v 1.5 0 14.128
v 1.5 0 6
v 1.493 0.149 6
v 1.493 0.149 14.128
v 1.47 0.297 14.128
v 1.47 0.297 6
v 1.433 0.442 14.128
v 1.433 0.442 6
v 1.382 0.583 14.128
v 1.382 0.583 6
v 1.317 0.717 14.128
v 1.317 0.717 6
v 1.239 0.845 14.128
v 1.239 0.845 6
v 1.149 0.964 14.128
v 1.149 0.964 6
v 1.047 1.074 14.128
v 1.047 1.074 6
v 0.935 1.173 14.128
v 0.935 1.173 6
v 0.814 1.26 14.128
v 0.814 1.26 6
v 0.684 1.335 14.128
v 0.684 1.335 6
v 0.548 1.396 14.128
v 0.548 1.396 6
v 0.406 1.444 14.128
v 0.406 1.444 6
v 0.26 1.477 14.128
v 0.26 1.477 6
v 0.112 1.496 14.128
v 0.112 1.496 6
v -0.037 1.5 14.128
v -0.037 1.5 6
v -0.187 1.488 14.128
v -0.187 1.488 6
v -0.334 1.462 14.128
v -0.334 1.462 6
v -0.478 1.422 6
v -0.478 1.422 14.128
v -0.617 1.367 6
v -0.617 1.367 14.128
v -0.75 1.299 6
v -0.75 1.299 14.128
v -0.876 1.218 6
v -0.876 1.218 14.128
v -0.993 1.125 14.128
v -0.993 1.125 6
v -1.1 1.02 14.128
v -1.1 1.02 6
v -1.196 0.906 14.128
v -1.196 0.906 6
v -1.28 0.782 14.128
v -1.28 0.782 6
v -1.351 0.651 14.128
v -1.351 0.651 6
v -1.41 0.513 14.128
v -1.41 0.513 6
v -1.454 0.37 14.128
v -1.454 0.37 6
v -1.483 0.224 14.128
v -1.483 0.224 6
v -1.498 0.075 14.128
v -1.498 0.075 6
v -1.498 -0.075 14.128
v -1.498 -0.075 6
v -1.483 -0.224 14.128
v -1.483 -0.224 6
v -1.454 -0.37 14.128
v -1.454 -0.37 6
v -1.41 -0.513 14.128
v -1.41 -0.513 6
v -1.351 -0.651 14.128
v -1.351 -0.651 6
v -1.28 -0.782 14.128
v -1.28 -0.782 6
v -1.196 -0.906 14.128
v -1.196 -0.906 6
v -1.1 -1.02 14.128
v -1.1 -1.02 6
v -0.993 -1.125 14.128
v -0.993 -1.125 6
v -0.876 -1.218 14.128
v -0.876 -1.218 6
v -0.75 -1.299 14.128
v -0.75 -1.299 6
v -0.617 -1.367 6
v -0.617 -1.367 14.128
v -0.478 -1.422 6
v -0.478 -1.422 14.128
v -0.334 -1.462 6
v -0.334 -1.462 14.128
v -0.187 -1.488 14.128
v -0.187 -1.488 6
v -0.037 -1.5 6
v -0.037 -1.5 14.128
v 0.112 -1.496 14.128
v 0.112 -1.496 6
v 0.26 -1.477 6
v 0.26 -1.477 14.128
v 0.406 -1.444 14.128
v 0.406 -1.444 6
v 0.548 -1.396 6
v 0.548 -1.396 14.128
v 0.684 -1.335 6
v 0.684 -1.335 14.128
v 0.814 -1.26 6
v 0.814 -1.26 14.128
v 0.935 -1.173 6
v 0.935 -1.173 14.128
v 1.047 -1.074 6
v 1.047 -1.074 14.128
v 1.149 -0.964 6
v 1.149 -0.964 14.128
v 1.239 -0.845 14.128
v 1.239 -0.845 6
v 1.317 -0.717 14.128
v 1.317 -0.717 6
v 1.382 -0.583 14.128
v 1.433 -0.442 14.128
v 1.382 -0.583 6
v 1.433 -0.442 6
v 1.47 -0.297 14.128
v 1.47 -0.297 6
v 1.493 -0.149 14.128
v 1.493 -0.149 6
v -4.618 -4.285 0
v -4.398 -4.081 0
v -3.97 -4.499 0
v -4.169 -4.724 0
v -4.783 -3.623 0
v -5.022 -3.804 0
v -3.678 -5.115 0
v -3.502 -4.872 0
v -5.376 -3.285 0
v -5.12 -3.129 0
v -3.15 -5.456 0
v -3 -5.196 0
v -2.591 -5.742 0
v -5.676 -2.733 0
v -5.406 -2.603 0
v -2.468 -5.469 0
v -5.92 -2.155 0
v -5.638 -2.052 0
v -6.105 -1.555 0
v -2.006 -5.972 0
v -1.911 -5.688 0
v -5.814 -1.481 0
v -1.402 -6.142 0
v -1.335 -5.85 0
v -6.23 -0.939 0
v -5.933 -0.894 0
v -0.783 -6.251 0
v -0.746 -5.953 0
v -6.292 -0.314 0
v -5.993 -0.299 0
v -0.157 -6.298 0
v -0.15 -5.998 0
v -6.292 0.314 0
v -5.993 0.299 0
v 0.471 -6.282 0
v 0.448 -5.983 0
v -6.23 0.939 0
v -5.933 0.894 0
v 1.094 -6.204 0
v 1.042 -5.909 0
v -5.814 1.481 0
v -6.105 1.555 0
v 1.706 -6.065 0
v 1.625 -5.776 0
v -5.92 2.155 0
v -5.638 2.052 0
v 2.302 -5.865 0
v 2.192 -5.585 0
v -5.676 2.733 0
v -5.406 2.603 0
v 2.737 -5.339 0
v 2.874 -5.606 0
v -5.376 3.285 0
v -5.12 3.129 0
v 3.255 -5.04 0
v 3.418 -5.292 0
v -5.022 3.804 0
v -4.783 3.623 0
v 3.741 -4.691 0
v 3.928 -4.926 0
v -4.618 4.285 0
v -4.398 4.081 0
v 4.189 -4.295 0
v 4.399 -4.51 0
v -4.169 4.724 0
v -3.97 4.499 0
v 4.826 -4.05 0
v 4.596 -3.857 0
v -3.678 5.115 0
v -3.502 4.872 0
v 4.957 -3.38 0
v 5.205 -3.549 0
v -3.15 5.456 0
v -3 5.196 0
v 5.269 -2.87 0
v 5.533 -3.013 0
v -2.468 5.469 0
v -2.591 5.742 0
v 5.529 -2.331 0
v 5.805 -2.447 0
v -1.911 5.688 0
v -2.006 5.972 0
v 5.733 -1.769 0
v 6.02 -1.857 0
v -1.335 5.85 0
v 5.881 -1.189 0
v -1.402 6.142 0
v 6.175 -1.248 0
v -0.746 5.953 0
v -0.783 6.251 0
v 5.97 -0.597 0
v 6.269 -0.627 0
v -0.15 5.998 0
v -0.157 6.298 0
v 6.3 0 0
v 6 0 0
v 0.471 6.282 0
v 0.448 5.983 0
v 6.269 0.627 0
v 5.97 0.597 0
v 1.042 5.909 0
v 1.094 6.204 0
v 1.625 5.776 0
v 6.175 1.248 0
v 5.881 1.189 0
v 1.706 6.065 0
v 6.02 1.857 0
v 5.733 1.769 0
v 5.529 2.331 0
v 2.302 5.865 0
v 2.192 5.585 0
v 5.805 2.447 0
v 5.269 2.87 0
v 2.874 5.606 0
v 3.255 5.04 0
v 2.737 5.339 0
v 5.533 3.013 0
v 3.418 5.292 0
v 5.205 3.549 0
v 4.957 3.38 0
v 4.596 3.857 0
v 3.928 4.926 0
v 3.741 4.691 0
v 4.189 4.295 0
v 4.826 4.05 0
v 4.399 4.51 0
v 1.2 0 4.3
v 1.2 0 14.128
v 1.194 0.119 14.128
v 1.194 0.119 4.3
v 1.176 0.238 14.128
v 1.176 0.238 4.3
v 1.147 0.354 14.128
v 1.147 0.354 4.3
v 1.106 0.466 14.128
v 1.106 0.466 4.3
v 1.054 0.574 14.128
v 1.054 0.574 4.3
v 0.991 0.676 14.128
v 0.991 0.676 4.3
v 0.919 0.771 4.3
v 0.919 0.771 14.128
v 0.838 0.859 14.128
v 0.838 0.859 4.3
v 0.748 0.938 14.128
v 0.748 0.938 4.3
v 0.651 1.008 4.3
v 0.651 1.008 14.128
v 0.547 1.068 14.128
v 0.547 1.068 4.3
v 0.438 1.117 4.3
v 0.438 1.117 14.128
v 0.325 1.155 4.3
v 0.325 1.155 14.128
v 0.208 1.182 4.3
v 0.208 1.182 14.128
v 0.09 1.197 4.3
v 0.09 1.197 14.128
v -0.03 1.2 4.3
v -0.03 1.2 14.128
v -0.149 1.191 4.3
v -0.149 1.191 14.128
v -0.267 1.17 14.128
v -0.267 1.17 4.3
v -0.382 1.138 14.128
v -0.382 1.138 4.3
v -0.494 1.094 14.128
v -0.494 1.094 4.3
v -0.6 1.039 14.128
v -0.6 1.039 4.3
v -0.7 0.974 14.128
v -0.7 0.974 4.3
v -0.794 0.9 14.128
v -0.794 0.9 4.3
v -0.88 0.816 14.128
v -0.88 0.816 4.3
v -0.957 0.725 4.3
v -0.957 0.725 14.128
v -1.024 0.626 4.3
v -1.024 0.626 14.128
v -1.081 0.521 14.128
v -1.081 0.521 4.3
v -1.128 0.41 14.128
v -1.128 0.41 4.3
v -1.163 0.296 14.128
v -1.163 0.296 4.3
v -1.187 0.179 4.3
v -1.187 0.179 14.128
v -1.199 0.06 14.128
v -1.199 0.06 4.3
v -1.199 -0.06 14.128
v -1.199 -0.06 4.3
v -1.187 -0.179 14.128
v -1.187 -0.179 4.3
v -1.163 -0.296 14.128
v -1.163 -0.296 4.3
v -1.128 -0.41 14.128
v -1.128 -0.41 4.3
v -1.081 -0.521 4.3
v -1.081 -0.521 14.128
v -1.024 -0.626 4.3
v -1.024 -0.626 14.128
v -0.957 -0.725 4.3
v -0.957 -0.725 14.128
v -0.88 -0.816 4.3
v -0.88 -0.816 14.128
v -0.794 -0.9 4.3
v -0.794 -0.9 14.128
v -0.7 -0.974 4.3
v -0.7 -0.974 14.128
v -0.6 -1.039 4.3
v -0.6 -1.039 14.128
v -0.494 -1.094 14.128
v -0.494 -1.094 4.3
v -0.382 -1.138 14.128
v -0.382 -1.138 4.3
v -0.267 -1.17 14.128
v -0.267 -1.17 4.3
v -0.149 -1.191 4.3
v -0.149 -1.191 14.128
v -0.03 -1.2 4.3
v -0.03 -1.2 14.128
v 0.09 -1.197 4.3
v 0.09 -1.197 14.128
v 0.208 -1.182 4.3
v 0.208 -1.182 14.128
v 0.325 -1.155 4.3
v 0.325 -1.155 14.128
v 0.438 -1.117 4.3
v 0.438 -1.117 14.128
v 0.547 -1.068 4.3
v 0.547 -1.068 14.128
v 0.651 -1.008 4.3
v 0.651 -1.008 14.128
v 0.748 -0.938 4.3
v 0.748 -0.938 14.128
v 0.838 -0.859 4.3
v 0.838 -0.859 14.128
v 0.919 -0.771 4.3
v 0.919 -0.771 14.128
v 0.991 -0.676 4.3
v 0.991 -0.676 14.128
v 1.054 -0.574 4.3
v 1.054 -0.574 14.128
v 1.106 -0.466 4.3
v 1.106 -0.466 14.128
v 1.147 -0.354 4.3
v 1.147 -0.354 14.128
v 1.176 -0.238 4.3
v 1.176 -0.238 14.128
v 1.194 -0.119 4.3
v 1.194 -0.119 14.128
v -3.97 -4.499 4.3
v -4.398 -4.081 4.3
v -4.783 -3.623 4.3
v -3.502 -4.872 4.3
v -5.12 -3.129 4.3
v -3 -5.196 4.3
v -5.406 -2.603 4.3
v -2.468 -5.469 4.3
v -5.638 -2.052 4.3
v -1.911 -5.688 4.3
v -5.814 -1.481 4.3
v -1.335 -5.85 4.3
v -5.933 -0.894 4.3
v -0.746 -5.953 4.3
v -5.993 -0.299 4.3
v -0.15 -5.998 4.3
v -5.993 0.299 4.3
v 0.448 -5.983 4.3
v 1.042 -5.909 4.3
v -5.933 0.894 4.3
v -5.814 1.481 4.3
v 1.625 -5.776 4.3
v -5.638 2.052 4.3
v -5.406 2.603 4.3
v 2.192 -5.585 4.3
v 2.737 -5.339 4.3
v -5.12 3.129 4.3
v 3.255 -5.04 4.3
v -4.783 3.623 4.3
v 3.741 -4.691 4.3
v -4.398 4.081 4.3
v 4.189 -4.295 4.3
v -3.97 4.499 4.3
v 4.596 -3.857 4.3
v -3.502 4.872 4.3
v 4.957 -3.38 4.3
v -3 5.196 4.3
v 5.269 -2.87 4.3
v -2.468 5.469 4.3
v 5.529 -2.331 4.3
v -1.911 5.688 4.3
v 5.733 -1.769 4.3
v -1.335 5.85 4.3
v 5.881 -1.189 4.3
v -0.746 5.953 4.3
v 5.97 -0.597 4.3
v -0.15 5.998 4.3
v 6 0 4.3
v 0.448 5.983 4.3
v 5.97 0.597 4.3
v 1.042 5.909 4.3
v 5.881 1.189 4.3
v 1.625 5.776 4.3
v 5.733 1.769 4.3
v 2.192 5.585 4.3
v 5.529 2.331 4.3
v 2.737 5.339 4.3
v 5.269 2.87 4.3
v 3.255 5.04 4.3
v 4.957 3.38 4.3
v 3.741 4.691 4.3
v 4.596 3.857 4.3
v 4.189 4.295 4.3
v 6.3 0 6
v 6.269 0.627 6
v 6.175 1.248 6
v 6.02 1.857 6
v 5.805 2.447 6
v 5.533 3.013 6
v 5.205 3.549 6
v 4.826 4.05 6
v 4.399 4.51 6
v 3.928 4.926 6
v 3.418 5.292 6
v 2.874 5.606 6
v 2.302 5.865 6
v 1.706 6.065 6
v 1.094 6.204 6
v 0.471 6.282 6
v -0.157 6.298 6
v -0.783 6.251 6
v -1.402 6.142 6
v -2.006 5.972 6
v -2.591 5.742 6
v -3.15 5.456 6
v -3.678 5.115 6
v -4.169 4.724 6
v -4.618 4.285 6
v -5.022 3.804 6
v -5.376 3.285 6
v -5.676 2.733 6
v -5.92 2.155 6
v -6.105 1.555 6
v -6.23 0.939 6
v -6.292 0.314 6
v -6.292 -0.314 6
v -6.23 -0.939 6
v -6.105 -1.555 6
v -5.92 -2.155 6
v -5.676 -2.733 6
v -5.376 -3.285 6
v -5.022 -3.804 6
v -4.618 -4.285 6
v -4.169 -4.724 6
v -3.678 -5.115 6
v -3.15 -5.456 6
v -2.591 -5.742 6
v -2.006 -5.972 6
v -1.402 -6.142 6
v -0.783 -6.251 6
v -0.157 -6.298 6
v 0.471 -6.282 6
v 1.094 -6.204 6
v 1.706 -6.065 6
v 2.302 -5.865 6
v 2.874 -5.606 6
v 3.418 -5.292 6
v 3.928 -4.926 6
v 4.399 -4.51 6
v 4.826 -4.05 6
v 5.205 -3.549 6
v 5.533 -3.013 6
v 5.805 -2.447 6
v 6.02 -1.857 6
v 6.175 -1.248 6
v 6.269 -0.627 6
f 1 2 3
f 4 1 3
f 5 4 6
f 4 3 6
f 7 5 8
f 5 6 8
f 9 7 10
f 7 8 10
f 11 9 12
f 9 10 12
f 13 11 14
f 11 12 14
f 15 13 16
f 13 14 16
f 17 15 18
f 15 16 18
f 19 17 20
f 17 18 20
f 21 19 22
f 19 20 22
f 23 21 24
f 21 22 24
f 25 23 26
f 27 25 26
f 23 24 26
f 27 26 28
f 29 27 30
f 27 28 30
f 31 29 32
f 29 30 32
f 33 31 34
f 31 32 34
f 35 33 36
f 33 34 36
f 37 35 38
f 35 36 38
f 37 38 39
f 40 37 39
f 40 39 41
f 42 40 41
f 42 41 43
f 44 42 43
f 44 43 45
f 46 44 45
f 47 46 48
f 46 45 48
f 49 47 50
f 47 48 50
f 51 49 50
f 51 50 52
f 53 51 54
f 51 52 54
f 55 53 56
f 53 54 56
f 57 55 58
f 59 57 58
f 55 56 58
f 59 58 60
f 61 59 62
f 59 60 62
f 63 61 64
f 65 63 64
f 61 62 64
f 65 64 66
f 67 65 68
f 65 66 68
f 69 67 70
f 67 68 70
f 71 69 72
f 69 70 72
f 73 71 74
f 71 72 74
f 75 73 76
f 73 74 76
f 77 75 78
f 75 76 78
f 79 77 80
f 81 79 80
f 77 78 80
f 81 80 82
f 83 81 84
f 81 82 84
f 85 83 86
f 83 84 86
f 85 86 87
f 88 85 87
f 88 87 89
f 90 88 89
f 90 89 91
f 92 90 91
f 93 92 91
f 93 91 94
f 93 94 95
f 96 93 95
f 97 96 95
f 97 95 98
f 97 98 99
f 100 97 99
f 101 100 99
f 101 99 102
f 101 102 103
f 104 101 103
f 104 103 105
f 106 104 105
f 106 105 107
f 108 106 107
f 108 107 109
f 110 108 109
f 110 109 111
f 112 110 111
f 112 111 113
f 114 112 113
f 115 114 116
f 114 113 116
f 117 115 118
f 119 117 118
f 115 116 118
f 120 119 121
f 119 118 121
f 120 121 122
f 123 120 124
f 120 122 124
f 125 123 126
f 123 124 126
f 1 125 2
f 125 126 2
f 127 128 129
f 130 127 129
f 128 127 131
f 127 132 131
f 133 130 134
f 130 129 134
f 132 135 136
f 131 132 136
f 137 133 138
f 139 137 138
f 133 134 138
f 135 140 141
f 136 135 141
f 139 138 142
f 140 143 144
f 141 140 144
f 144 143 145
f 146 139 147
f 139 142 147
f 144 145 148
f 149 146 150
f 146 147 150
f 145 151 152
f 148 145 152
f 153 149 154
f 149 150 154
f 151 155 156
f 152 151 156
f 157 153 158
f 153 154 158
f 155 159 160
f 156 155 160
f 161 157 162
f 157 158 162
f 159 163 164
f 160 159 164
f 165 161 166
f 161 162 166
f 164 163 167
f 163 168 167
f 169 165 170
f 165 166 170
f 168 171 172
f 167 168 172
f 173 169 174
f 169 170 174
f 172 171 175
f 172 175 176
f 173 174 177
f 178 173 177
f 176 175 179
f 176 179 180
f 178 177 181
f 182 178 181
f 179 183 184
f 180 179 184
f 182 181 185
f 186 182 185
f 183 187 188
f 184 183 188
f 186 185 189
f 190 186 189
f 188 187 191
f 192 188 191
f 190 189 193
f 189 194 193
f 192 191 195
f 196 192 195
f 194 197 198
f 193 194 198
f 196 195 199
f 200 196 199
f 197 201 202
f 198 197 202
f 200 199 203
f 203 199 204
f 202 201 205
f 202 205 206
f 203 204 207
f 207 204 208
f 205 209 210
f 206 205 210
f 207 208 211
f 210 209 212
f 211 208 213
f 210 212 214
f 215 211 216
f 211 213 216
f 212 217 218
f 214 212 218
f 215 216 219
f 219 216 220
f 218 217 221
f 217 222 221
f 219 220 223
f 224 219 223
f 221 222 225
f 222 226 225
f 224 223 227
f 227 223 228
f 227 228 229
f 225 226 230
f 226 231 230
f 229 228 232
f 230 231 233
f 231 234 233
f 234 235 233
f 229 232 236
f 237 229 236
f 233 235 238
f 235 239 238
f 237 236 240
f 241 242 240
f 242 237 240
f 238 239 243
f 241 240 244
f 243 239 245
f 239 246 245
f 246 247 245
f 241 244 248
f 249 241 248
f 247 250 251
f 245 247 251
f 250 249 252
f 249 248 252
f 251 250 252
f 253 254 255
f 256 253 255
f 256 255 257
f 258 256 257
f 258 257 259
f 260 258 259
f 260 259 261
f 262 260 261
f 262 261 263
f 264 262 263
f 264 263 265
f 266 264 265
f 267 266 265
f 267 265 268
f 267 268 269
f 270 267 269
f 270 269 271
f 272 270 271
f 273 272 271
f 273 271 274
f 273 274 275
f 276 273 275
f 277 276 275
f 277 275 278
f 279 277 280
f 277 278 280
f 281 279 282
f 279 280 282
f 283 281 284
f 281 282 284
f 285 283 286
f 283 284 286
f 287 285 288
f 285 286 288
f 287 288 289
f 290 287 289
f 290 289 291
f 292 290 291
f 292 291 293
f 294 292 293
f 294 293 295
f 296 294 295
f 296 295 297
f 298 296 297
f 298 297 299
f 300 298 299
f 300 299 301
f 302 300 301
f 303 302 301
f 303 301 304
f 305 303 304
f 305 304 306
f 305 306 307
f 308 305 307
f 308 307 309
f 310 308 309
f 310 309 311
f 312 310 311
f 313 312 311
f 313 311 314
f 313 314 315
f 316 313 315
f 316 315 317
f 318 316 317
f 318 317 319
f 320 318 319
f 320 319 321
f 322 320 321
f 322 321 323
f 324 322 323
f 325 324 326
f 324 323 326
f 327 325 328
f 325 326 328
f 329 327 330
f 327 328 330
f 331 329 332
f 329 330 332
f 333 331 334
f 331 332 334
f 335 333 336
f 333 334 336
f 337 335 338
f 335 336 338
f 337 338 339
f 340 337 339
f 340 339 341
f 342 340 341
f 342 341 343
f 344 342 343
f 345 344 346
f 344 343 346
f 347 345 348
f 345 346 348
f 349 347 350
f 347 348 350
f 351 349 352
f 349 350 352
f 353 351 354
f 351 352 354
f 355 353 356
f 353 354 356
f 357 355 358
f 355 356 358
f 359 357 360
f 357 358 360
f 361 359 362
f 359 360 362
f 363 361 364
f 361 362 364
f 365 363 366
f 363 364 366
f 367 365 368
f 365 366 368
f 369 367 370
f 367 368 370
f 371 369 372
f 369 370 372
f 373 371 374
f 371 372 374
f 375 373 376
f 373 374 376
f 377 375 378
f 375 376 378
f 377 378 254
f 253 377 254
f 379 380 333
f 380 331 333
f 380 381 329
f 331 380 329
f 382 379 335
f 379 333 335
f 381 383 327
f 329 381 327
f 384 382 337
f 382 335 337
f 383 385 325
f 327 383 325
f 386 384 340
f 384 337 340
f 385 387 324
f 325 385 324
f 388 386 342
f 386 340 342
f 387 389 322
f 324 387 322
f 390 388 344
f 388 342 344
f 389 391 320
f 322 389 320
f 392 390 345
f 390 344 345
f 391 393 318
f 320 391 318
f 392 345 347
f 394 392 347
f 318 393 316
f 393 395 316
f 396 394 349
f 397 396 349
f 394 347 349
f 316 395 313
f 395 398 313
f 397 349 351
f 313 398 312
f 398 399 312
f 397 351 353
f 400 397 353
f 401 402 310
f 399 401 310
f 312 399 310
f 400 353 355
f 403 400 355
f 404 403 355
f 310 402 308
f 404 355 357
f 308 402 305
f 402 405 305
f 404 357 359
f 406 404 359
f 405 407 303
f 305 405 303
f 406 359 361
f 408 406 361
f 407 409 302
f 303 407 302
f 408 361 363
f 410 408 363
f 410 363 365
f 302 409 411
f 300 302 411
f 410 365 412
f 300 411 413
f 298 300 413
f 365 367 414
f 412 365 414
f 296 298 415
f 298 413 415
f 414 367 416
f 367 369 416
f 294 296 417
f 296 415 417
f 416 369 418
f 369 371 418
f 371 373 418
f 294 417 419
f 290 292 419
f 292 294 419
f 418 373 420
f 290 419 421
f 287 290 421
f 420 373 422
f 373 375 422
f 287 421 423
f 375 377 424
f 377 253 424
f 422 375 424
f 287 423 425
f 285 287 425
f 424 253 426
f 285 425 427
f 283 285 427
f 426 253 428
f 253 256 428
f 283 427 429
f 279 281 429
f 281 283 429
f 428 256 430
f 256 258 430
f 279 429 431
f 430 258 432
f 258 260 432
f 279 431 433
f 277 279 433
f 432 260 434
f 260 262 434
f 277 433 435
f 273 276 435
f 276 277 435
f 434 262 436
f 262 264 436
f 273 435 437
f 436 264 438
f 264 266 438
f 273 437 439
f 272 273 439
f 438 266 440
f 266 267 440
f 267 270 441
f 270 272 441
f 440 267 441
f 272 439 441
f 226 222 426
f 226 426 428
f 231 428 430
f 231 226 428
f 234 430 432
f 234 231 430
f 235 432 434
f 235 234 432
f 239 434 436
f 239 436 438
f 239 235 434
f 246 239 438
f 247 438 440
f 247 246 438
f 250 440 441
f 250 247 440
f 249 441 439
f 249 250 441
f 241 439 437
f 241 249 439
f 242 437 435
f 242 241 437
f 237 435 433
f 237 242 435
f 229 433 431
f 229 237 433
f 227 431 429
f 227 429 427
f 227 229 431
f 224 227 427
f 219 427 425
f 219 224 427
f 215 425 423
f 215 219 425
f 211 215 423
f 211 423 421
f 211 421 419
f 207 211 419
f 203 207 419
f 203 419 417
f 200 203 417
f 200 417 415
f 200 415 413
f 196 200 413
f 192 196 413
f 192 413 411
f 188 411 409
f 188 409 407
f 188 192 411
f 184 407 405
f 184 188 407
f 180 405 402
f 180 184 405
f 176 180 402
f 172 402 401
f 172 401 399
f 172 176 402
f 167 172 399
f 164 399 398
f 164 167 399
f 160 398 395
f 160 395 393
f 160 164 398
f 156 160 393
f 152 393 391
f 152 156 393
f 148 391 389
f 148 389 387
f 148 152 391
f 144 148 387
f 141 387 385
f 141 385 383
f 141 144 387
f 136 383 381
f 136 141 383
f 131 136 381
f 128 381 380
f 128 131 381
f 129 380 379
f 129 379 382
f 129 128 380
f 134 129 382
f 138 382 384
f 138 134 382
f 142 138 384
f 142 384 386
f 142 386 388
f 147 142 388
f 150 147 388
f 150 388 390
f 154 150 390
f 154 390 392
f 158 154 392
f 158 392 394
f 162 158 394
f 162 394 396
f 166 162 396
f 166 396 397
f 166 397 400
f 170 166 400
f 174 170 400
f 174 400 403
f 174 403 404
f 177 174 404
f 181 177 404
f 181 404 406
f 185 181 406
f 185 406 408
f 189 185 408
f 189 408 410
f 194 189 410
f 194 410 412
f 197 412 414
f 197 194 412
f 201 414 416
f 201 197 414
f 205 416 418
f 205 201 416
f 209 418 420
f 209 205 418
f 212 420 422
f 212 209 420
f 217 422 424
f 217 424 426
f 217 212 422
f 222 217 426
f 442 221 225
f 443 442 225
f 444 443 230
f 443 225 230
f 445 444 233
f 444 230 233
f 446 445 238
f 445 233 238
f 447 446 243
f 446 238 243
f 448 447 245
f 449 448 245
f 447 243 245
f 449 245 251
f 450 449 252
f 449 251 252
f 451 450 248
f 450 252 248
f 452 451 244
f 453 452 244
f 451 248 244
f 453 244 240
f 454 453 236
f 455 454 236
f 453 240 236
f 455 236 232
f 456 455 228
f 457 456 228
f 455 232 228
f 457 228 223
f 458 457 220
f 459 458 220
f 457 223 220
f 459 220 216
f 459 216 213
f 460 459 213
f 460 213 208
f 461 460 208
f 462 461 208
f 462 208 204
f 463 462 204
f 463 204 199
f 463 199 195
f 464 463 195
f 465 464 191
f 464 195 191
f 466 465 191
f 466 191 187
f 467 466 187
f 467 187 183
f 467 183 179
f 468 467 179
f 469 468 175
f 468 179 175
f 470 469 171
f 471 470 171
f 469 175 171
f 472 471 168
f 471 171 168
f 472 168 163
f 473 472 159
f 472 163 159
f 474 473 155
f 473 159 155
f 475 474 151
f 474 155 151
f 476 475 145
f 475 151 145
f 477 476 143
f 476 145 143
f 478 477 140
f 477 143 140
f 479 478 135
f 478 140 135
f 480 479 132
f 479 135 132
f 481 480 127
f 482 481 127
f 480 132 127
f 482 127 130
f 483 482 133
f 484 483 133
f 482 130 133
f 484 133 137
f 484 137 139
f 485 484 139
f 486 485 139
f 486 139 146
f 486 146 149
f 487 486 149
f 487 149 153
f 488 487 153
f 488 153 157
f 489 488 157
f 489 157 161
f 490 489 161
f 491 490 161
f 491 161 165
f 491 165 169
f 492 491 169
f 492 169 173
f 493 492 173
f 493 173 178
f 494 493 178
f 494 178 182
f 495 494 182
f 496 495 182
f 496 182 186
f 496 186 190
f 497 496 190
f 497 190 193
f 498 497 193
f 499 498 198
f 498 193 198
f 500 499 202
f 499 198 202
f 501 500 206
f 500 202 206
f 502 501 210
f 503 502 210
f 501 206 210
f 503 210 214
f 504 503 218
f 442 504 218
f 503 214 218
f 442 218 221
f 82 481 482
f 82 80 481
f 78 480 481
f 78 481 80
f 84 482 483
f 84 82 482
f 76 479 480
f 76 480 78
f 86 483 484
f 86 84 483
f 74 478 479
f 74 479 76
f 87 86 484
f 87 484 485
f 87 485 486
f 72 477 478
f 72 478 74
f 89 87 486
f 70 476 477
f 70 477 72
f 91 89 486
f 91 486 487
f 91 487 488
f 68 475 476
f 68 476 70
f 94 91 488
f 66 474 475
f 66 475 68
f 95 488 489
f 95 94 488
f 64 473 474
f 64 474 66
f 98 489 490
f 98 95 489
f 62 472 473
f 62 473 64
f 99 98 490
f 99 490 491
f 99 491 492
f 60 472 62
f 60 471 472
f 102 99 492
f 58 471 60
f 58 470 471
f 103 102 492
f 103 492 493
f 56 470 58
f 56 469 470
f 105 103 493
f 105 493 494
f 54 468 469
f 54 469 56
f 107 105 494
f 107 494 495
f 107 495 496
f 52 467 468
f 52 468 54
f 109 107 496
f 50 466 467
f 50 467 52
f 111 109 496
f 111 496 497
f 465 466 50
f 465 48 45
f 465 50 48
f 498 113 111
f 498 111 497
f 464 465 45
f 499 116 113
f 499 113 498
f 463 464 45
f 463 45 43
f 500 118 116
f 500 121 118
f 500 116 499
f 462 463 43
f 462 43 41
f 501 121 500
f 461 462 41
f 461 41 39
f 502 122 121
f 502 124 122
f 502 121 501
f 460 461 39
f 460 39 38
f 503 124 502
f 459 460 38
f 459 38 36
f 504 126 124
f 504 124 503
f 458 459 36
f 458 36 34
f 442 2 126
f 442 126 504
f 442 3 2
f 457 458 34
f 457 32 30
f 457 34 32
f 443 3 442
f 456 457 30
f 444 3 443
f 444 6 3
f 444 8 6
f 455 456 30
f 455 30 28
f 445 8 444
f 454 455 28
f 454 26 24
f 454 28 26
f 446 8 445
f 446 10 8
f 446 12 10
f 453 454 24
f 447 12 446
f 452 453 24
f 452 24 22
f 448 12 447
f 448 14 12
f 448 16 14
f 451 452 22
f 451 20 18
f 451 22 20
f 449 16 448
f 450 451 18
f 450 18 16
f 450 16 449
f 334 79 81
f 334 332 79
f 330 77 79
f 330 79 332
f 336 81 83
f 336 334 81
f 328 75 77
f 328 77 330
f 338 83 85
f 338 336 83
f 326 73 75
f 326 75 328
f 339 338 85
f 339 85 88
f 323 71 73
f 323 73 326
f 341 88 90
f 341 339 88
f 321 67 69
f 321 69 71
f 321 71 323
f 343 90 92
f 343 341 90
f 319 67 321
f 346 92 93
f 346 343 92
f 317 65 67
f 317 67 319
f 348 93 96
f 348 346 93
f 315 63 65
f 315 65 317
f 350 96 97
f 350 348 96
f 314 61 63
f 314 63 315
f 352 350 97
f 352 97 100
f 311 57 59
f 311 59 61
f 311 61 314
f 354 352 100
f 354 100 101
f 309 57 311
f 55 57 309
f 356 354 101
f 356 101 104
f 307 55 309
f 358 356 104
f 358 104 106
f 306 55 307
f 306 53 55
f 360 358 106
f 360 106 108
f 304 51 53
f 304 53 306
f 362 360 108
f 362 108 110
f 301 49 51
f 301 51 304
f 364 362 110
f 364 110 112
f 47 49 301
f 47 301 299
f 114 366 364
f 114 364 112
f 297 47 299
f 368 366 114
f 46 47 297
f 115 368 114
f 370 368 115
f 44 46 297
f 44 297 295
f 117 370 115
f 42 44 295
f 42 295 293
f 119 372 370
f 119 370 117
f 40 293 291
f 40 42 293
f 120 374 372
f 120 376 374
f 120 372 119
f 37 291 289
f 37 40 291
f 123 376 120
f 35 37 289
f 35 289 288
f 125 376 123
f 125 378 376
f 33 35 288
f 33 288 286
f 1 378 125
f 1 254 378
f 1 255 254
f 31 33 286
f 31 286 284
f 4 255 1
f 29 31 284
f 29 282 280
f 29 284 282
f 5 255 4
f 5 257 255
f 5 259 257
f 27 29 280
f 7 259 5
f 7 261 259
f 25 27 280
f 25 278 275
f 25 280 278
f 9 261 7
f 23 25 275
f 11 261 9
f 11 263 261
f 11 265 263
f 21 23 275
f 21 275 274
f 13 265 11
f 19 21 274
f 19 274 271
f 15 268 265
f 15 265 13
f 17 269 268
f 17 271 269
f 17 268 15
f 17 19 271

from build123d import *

# Parameters (mm, degrees)
F0_R     = 6.3
F0_R_2   = 6
F2_DEPTH = 6
F3_R     = 1.5
F4_DEPTH = 8.128
F5_R     = 1.2
F6_DEPTH = 25.4
F7_DEPTH = 4.3


with BuildPart() as f2:
    # F0 (on Top) → F2 (new body)
    with BuildSketch(Plane.XY):
        Circle(F0_R)
        Circle(F0_R_2, mode=Mode.SUBTRACT)
        Circle(F0_R_2)
    extrude(amount=F2_DEPTH)

    # F3 (on face) → F4 (join)
    with BuildSketch(Plane.XY.offset(6)):
        Circle(F3_R)
    extrude(amount=F4_DEPTH)

    # F5 (on face) → F6 (cut)
    with BuildSketch(Plane.XY.offset(14.128)):
        Circle(F5_R)
    extrude(amount=-F6_DEPTH, mode=Mode.SUBTRACT)

    # F0 (on Top) → F7 (cut)
    with BuildSketch(Plane.XY):
        Circle(F0_R_2)
    extrude(amount=F7_DEPTH, mode=Mode.SUBTRACT)


solid = f2.part
